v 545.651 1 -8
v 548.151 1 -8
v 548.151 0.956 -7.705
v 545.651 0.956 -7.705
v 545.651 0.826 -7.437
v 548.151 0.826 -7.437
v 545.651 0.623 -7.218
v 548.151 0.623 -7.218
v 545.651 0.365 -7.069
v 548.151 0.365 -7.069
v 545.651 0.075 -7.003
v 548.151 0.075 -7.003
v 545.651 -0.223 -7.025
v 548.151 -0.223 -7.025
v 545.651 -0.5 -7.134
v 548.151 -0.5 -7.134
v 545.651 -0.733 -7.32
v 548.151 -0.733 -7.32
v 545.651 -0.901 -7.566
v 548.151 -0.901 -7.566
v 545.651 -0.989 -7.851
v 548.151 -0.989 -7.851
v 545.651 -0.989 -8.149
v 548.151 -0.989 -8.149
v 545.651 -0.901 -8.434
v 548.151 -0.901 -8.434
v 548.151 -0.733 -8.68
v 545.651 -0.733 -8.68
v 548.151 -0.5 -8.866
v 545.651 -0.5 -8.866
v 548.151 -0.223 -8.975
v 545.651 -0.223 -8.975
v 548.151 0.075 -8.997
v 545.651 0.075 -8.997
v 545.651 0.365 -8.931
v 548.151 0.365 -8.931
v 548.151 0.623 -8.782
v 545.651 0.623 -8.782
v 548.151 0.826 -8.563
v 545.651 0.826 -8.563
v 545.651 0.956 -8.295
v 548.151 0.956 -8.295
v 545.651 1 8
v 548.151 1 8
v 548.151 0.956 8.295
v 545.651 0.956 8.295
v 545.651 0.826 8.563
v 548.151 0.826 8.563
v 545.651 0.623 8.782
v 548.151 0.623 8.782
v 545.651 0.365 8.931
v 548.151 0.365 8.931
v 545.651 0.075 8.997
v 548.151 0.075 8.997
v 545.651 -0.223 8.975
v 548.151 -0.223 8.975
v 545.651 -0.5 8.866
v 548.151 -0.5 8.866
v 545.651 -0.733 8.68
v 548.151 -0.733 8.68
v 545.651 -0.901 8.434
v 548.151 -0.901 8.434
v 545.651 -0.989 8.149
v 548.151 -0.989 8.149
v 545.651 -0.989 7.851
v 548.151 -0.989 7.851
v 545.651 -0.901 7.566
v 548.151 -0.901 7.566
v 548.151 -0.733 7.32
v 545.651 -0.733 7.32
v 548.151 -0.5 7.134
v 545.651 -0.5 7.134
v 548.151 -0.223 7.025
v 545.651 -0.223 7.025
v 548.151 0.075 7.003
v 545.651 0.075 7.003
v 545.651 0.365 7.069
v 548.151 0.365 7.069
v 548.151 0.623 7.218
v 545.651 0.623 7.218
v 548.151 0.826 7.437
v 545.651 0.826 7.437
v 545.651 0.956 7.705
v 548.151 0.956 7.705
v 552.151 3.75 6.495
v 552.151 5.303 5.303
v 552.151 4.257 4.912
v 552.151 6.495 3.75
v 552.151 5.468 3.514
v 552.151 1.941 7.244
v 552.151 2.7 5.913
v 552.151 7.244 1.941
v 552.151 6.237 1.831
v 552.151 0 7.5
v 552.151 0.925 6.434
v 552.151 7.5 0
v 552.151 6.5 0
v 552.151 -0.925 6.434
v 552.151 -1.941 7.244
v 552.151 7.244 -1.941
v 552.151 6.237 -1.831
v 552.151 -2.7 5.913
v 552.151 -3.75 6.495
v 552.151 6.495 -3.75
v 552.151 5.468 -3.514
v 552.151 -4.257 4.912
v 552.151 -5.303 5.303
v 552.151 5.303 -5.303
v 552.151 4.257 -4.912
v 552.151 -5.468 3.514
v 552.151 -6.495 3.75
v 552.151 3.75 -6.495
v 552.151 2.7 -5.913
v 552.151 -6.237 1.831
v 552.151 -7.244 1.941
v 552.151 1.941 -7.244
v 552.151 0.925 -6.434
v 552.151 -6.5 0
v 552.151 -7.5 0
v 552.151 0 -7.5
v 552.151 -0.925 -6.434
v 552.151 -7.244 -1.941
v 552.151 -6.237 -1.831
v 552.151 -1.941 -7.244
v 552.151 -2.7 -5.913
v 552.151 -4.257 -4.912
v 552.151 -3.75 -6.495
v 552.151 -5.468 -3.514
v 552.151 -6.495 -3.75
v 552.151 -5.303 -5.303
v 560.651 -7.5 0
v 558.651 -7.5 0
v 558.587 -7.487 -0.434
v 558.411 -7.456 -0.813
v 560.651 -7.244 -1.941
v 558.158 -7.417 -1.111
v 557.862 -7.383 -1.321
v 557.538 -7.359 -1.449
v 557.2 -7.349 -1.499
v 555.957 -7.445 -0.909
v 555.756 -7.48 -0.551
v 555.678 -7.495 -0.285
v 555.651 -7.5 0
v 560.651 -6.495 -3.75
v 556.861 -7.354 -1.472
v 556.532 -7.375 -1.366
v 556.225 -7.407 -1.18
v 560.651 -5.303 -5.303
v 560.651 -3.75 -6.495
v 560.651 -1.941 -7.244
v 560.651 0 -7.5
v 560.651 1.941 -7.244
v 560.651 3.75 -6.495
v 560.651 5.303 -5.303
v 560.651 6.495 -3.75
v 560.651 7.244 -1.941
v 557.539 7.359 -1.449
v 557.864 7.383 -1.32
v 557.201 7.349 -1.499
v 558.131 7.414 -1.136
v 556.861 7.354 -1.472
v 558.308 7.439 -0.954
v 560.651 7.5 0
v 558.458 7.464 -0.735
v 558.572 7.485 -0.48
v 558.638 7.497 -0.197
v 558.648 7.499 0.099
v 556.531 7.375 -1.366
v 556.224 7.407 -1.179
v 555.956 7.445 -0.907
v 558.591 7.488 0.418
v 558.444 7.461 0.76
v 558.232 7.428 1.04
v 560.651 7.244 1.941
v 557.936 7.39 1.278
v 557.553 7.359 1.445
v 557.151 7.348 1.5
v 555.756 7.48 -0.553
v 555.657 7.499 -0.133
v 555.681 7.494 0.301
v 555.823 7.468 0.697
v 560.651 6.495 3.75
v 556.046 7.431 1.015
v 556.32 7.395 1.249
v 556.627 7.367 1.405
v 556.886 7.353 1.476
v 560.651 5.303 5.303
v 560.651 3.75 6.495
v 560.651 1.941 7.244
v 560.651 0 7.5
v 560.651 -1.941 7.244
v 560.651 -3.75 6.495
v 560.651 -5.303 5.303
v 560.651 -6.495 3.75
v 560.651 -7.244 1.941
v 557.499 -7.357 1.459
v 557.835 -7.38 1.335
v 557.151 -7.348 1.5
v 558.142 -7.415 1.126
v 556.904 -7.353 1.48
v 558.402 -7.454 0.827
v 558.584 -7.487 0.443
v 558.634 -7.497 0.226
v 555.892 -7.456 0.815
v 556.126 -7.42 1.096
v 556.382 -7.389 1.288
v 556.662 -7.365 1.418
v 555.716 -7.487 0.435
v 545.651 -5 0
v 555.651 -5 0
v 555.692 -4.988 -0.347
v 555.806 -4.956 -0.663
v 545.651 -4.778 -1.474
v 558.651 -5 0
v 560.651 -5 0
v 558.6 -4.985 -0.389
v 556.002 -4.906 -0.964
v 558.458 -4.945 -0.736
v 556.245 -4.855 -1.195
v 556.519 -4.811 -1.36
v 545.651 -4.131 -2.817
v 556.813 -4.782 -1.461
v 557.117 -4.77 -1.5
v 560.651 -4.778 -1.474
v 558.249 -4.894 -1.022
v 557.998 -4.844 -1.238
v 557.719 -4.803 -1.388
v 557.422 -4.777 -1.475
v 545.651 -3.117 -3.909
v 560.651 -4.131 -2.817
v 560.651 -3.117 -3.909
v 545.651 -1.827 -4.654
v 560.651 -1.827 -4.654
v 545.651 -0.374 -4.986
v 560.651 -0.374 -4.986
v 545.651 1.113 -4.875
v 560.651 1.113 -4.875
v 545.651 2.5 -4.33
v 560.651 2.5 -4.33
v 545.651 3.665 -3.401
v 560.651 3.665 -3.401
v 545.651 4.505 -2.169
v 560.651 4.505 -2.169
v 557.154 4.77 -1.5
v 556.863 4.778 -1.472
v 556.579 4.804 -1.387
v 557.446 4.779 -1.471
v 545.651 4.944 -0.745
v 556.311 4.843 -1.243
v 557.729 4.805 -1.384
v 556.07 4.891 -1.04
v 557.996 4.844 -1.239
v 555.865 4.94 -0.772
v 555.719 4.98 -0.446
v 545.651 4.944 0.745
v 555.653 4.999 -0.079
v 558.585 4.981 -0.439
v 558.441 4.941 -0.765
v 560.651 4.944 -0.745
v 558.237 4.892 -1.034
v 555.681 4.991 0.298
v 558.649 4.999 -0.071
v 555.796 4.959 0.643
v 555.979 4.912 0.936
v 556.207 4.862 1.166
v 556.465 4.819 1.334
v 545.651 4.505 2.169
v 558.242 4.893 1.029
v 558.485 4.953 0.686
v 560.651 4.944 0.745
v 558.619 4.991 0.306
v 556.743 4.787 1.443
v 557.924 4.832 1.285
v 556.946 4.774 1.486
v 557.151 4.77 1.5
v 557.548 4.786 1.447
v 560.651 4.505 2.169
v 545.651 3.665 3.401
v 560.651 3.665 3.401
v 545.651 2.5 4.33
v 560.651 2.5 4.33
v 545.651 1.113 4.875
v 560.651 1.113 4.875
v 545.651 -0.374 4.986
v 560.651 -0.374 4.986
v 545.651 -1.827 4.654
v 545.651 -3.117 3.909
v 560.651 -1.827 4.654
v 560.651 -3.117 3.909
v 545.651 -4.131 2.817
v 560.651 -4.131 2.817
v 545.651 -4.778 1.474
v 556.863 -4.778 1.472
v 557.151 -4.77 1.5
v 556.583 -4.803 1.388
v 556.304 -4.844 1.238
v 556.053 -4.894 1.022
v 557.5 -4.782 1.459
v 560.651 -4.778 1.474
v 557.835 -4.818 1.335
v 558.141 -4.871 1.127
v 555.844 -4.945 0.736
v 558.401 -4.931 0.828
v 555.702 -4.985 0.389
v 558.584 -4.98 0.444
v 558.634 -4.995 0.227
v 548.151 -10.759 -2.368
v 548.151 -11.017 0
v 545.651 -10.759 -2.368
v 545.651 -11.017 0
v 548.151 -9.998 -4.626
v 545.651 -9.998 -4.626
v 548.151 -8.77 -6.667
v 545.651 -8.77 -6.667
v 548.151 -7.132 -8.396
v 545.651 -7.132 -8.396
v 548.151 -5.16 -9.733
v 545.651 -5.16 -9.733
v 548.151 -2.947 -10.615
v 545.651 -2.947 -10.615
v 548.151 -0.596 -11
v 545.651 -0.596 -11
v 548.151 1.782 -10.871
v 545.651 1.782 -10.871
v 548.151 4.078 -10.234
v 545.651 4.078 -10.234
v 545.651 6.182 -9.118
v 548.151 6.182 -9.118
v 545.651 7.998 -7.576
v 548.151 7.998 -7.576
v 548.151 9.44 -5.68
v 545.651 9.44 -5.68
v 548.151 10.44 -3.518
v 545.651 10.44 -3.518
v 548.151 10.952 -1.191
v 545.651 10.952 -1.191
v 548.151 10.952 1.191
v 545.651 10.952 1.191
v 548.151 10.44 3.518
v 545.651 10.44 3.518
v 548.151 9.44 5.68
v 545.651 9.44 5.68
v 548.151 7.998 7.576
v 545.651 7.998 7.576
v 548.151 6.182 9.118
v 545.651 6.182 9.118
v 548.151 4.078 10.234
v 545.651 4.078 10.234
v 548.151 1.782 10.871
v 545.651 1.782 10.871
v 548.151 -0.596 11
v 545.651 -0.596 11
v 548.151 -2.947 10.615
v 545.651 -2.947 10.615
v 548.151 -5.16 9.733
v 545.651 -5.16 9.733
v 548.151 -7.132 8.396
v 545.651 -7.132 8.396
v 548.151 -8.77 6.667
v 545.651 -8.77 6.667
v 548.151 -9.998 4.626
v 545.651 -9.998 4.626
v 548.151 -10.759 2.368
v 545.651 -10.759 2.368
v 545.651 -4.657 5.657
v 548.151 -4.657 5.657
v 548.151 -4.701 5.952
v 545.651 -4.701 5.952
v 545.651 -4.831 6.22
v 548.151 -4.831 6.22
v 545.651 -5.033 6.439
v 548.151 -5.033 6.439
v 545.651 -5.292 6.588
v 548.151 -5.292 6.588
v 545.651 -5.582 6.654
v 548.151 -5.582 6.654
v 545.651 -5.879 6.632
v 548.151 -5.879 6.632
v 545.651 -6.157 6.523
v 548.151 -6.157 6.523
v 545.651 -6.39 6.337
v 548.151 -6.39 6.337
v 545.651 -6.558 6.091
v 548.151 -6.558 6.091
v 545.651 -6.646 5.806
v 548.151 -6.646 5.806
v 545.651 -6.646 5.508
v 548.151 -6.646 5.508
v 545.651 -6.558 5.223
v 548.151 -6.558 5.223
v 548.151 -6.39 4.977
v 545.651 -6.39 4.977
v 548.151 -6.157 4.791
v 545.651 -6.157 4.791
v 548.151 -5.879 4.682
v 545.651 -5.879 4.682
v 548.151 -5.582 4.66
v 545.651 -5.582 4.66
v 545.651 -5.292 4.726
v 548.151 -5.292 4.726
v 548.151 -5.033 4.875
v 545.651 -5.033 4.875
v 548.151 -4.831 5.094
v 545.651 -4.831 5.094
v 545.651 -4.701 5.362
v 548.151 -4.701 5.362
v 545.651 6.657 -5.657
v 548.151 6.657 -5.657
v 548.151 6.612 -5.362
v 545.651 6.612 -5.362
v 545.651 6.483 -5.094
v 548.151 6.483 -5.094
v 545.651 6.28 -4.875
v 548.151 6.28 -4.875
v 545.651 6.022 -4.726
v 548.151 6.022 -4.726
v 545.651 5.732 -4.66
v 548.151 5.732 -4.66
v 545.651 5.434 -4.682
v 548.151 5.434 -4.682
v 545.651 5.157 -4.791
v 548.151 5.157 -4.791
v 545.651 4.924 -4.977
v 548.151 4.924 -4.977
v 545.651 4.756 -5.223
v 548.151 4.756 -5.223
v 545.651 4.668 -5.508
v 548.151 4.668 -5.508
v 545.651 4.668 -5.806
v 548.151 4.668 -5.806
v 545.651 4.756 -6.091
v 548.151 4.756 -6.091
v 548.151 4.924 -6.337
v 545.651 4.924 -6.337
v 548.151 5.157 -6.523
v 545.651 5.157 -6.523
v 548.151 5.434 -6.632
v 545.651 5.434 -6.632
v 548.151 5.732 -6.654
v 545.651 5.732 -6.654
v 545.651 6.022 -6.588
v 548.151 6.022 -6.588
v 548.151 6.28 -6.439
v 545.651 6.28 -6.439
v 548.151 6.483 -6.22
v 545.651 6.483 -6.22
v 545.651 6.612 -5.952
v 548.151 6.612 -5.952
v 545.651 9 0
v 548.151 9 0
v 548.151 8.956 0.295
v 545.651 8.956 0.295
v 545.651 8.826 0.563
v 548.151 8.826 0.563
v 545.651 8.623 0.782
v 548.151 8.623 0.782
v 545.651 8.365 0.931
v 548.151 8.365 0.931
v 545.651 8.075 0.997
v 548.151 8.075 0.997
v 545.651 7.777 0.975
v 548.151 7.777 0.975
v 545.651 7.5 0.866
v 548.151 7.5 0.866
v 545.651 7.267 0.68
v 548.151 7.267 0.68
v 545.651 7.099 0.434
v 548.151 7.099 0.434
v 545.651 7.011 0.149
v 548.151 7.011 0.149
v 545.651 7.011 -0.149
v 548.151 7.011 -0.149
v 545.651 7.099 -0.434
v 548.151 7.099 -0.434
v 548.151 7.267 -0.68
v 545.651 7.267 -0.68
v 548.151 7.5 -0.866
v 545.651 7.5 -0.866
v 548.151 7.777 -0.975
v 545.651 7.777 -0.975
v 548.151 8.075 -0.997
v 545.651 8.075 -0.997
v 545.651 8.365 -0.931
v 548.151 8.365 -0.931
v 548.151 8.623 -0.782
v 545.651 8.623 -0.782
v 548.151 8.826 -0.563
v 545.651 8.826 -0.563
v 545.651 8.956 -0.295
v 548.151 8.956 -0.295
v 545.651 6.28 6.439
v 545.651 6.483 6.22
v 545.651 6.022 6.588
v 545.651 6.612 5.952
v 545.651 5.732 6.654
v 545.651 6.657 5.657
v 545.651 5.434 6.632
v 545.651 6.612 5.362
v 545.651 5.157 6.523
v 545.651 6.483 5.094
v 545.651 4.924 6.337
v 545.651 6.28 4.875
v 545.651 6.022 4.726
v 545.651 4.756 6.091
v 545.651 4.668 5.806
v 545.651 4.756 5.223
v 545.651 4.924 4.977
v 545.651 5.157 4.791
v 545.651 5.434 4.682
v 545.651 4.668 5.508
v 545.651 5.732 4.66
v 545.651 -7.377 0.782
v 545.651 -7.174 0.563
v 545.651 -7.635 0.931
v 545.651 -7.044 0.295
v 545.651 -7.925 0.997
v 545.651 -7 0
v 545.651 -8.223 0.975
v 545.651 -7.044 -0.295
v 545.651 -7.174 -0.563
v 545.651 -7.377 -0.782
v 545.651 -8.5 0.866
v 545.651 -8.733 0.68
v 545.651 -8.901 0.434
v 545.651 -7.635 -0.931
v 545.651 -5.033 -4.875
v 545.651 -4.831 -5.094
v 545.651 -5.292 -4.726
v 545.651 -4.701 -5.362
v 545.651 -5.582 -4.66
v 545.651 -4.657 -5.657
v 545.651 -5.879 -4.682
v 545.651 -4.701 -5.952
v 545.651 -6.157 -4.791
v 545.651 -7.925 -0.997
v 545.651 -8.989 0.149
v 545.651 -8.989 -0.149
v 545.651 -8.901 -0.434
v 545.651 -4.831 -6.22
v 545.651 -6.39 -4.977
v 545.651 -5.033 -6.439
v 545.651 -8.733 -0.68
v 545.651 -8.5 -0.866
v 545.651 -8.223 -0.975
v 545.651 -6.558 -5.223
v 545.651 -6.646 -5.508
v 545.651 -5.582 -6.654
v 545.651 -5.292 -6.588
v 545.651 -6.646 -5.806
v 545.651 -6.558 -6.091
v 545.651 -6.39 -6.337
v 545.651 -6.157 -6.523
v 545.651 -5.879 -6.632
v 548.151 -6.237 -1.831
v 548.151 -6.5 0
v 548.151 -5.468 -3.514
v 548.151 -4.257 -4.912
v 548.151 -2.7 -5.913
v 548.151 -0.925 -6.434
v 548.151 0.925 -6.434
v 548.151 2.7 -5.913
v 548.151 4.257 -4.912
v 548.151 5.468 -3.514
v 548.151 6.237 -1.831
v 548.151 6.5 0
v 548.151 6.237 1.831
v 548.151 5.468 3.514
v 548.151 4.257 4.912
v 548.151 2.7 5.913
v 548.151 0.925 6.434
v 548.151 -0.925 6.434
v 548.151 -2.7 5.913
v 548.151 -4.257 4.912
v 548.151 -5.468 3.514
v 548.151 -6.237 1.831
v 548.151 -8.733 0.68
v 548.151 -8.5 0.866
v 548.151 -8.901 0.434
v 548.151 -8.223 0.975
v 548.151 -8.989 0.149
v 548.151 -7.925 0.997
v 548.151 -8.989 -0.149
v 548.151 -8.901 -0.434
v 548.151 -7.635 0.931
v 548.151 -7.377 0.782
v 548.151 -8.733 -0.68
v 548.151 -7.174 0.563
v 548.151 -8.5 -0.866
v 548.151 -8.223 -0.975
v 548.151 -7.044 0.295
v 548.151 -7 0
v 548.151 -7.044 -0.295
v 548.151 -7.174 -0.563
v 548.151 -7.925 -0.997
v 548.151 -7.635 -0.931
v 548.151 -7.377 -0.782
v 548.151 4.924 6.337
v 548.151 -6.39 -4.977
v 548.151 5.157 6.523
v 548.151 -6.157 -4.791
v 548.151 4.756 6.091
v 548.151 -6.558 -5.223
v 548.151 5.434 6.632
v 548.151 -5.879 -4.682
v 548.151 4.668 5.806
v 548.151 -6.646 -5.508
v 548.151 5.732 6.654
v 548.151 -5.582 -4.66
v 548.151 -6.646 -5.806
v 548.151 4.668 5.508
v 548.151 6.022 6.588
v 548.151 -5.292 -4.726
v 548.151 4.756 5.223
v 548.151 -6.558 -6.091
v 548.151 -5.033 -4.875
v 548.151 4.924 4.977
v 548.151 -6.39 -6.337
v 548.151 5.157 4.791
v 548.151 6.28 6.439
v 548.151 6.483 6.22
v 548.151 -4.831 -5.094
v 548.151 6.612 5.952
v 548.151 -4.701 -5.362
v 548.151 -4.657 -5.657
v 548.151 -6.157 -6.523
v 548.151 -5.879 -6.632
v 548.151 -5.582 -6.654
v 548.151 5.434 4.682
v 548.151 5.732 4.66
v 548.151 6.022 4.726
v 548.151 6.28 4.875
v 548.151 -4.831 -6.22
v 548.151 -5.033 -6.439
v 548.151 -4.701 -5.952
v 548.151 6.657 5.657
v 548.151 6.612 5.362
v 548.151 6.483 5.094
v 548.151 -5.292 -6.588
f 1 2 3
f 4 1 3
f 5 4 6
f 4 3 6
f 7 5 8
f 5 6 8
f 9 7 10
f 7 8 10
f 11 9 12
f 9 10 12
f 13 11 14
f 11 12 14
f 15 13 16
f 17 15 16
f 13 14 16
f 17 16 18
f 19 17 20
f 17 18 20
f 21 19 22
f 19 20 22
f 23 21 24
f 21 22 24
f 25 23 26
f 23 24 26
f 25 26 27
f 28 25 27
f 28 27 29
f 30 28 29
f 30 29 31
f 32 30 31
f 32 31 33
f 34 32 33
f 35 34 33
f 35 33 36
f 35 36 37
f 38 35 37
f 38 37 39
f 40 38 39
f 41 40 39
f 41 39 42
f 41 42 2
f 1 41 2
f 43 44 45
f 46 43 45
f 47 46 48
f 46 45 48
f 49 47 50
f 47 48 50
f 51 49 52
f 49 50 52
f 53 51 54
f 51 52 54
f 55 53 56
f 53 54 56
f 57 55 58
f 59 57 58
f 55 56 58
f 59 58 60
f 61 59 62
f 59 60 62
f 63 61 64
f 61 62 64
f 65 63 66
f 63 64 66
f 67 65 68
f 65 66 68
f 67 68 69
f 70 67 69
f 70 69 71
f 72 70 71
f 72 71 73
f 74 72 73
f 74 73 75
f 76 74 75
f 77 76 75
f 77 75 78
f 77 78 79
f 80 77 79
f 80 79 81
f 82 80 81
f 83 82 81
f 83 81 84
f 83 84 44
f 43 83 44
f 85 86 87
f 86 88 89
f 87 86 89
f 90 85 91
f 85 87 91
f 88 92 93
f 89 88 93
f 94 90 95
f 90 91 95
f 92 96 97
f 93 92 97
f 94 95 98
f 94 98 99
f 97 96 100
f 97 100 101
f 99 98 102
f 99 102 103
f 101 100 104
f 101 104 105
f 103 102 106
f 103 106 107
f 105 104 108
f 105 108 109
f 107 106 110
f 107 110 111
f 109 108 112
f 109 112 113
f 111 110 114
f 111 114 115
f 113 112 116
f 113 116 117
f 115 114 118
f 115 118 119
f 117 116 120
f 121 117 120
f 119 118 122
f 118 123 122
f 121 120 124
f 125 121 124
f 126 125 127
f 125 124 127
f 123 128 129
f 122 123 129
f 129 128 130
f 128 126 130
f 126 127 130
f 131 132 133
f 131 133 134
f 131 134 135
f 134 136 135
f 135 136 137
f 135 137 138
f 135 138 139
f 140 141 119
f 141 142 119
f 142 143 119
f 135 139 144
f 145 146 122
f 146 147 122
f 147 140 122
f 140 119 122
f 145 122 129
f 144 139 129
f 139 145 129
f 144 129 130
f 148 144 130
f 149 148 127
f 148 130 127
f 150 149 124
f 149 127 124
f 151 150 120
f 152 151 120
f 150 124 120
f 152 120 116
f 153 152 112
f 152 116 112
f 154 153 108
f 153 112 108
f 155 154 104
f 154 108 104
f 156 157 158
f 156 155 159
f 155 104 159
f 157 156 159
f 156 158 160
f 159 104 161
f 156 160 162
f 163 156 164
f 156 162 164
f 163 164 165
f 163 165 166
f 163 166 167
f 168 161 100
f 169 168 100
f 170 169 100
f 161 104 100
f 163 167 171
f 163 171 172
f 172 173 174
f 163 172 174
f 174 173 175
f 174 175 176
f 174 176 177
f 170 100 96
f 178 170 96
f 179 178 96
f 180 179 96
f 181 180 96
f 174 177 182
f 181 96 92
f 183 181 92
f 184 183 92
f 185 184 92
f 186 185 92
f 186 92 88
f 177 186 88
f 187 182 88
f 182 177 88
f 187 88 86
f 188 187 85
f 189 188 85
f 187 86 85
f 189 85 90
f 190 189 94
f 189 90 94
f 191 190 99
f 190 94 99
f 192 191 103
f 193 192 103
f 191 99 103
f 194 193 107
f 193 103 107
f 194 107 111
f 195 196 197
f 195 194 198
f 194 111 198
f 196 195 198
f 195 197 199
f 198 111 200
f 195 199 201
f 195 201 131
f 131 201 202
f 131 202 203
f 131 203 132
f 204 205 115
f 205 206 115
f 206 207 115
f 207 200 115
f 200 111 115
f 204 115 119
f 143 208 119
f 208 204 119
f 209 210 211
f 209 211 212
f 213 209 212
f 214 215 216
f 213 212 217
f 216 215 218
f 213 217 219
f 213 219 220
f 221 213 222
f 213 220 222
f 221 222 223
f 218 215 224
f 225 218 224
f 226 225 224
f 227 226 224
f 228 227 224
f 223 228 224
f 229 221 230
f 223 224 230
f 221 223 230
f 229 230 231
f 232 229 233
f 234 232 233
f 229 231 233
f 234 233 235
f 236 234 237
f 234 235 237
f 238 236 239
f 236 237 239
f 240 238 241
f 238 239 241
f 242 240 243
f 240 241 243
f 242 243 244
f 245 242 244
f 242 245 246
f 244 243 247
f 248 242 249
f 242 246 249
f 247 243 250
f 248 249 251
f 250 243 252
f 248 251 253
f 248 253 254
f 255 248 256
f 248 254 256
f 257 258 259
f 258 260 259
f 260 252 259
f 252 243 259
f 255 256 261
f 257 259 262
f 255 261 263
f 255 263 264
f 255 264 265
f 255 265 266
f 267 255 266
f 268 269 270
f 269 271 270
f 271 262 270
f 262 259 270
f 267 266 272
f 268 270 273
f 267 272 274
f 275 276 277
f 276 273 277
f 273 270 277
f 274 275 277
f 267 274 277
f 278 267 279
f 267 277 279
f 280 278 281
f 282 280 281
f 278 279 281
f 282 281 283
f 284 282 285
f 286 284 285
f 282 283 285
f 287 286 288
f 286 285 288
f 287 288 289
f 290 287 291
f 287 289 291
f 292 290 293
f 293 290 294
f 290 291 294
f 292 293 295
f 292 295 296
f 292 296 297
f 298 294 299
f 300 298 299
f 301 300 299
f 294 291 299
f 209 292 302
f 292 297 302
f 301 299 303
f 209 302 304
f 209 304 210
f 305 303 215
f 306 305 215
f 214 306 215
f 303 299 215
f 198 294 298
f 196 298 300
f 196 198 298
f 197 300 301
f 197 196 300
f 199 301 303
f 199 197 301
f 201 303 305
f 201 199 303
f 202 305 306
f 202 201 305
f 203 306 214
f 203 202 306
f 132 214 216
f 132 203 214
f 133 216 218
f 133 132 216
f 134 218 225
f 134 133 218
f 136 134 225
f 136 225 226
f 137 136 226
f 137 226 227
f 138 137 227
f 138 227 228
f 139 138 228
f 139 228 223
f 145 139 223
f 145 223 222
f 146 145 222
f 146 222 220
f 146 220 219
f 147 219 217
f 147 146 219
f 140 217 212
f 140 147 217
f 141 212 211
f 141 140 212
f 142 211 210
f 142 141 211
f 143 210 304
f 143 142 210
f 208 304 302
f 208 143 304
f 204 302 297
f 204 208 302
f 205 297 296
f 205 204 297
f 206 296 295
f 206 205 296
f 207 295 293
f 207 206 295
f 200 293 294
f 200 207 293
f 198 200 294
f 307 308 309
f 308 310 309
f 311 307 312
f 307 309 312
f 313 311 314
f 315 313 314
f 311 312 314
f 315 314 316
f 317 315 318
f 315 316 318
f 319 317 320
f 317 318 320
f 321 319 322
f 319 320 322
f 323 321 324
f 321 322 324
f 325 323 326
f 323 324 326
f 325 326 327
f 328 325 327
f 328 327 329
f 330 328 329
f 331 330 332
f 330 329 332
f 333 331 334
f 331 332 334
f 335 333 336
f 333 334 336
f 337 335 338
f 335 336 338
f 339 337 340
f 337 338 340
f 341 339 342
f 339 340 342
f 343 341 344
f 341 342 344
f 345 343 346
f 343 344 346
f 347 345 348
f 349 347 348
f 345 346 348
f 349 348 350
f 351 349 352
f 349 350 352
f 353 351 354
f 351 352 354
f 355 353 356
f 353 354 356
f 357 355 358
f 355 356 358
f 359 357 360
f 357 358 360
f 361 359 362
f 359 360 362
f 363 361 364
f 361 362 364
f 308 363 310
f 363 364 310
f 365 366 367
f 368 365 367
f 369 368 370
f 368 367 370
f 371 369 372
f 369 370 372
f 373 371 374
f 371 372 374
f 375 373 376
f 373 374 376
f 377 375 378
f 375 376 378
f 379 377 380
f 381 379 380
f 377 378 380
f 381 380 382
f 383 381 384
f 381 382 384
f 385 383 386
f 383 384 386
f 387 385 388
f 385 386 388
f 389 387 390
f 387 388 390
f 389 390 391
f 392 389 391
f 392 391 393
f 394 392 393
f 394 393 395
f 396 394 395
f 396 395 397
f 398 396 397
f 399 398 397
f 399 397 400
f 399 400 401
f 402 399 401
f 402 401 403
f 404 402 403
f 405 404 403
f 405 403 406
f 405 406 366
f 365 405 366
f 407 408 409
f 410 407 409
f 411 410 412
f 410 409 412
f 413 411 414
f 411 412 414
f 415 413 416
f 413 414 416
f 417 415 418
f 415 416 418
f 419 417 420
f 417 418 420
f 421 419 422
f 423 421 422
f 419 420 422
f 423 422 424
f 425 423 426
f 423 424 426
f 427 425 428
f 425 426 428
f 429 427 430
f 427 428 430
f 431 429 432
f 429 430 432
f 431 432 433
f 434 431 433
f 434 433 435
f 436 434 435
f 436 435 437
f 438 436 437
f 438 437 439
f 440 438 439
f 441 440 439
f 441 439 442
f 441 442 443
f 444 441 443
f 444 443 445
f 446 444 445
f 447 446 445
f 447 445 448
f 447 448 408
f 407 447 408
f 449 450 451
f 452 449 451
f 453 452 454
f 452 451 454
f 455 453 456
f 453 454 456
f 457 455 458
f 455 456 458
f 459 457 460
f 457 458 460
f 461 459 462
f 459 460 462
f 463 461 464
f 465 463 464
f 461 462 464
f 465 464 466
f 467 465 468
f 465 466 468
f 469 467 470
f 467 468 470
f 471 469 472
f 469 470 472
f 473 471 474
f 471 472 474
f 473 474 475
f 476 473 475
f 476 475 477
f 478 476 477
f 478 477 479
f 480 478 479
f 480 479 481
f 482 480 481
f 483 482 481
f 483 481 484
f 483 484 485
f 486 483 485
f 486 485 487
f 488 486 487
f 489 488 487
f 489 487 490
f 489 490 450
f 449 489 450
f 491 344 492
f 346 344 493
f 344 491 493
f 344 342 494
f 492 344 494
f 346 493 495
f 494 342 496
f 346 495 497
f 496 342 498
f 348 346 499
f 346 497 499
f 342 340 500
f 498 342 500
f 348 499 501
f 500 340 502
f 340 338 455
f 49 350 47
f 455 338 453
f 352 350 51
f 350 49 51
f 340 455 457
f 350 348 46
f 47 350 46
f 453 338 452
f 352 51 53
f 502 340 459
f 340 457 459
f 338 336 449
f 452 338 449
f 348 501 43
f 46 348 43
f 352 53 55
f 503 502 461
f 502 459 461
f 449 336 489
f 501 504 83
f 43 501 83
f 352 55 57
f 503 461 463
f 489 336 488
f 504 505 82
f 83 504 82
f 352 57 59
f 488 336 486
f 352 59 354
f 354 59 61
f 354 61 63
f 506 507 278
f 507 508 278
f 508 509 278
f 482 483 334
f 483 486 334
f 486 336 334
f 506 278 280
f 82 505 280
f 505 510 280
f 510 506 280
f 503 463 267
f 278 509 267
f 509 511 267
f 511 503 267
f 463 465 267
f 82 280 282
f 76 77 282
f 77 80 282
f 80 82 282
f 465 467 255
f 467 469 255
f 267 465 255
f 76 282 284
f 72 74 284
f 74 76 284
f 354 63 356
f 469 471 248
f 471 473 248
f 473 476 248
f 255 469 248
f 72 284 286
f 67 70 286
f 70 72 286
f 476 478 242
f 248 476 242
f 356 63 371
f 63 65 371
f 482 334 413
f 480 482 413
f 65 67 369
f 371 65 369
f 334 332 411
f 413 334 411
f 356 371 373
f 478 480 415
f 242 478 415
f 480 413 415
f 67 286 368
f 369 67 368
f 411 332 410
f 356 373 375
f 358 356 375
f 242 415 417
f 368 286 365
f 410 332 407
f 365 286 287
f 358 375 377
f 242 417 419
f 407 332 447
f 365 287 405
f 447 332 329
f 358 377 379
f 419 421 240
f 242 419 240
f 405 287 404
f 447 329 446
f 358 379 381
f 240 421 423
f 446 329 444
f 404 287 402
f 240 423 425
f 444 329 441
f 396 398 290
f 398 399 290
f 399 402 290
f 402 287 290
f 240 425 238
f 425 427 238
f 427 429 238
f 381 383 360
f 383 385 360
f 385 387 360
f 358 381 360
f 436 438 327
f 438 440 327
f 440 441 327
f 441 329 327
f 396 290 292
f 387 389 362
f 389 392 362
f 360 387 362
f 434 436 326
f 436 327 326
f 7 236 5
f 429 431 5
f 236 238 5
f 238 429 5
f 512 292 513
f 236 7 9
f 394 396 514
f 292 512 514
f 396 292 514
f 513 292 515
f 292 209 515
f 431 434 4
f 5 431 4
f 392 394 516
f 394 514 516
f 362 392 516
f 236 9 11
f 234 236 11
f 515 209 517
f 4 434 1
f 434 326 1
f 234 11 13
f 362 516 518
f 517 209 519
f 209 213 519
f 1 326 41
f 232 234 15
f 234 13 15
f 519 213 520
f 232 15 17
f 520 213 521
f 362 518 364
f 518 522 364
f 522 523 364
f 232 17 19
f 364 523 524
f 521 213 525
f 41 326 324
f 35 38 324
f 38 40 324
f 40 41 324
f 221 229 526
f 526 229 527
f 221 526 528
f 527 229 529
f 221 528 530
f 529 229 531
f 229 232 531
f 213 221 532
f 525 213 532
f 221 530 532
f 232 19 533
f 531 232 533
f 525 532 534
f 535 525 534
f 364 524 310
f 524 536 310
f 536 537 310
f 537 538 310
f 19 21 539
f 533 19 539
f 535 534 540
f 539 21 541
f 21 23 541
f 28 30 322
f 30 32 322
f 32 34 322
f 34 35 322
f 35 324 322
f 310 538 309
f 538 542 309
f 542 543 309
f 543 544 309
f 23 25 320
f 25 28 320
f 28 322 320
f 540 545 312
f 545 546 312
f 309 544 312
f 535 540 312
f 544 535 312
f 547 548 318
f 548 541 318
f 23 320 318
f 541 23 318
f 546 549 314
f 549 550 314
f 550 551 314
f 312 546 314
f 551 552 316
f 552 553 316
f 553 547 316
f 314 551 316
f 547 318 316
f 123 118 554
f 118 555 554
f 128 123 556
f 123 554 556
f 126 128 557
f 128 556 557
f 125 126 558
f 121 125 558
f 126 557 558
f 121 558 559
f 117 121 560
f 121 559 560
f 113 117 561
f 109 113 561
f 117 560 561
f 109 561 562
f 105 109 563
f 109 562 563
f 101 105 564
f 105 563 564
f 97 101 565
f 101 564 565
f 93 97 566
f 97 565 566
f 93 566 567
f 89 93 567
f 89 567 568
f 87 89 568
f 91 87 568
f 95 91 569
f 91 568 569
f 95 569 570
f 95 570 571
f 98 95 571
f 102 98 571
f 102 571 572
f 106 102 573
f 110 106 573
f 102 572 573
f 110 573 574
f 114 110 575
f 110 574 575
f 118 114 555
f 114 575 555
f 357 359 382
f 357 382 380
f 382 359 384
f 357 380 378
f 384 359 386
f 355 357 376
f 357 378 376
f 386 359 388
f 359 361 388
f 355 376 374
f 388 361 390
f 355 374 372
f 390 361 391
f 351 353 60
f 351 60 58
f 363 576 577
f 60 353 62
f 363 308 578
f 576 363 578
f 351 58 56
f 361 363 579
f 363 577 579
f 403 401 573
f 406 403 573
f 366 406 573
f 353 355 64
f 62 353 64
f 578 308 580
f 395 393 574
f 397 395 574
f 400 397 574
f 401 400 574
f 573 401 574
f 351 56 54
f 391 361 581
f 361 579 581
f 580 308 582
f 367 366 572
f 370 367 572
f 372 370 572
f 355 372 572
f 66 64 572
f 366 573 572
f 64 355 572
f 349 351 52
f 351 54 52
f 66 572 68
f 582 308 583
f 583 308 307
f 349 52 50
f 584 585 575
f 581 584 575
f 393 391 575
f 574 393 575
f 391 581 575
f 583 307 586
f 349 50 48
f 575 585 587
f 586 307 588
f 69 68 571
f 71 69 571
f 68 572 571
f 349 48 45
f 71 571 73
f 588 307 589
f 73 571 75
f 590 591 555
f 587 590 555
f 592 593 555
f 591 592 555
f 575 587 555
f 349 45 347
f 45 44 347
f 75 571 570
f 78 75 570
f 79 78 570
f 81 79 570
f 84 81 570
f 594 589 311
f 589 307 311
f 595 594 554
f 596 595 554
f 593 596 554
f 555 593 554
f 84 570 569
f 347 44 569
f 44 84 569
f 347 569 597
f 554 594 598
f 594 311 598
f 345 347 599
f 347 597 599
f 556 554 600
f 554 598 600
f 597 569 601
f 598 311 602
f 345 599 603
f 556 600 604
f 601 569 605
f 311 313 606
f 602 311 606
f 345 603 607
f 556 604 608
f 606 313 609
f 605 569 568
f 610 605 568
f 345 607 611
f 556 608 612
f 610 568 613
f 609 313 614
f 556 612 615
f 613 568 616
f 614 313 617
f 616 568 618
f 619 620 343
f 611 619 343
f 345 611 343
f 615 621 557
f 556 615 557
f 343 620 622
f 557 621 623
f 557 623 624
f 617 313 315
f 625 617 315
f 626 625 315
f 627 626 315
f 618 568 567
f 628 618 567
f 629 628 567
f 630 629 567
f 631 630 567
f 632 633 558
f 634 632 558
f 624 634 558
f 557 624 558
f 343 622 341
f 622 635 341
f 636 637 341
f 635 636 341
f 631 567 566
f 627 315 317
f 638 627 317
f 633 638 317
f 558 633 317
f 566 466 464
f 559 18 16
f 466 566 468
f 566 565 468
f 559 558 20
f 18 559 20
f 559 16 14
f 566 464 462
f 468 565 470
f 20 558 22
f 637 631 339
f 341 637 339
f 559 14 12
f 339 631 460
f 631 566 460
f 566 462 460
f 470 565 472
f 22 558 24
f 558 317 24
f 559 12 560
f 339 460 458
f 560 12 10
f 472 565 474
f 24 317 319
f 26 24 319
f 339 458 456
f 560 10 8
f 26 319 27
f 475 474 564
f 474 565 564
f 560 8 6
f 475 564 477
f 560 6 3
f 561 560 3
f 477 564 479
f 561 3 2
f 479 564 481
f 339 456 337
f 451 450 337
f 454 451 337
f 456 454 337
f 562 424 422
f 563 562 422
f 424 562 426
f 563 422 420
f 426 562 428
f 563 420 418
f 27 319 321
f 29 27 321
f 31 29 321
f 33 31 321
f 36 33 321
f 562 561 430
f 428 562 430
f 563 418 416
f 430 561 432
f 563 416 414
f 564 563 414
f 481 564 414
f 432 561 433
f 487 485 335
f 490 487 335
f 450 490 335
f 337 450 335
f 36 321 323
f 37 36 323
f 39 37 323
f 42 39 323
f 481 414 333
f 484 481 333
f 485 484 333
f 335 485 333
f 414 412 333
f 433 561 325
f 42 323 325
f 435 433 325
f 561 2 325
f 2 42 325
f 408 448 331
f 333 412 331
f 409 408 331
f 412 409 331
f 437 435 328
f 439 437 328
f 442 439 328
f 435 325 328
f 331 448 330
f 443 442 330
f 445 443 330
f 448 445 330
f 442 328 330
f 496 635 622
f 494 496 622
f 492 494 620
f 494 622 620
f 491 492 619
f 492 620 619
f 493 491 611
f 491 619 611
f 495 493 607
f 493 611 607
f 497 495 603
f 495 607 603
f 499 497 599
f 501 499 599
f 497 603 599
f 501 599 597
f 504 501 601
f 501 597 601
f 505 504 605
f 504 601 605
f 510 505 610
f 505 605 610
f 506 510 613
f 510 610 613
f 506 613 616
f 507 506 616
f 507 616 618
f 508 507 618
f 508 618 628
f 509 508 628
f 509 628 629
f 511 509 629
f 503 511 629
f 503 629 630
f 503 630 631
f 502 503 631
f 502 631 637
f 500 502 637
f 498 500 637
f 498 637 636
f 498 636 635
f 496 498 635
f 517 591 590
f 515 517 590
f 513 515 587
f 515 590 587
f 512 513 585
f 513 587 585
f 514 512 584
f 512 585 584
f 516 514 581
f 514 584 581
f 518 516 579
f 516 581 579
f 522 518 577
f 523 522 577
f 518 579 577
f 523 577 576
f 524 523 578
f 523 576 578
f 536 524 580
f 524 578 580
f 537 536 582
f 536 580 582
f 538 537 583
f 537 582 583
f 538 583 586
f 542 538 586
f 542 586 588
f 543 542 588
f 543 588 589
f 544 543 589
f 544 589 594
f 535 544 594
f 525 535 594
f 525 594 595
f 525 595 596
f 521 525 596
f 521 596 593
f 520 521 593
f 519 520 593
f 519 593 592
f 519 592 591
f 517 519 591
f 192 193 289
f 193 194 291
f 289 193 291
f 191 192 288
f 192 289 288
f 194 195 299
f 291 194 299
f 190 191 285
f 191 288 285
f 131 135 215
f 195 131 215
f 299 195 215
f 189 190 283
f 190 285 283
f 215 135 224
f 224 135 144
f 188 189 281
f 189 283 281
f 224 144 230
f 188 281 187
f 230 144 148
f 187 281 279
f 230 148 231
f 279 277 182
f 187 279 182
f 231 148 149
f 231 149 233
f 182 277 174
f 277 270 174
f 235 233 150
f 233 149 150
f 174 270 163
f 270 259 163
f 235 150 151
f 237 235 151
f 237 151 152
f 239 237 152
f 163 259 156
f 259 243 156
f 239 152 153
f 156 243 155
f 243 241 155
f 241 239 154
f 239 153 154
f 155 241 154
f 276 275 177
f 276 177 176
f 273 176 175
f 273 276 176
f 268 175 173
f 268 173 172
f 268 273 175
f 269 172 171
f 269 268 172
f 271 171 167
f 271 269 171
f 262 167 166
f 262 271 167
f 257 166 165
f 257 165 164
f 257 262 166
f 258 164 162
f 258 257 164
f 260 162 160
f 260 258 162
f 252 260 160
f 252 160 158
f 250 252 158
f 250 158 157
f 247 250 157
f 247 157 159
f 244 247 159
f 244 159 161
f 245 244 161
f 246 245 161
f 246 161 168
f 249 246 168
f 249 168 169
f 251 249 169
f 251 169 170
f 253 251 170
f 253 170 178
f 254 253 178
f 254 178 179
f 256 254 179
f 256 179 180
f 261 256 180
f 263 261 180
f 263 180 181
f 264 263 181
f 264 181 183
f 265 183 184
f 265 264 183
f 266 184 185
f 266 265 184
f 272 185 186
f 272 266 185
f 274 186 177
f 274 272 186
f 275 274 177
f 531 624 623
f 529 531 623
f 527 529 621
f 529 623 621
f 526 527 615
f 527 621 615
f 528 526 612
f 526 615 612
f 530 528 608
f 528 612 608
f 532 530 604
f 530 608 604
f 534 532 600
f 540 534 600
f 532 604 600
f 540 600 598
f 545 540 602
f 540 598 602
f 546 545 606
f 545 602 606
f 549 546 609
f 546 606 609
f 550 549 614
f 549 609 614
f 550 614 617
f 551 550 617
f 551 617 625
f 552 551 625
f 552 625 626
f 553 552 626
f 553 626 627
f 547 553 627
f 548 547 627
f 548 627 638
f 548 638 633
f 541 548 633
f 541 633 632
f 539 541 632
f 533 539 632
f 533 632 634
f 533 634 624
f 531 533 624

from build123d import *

# Parameters (mm, degrees)
CUT_EXTRUDE1_DEPTH      = 561.867355885
CUT_EXTRUDE1_DEPTH_BACK = 561.867355885
SKETCH3_R               = 1.5
SKETCH13_R              = 1
CUT_EXTRUDE2_DEPTH      = 20.974512648


with BuildPart() as part:
    # Sketch2 → Revolve1 (revolve)
    with BuildSketch(Plane.XY, mode=Mode.PRIVATE) as revolve1_sk:
        Polygon((560.650925037, 5), (560.650925037, 7.5), (552.150925037, 7.5), (552.150925037, 6.5), (548.150925037, 6.5), (548.150925037, 7.5), (548.150925037, 11.016604582), (545.650925037, 11.016604582), (545.650925037, 5), align=None)
    revolve(revolve1_sk.sketch.rotate(Axis((542.916757592, 0, 0), (1, 0, 0)), 180), axis=Axis((542.916757592, 0, 0), (1, 0, 0)))

    # Sketch3 → Cut-Extrude1 (cut, two sides: drawn at the far end of the back side and taken through both)
    with BuildSketch(Plane(origin=(0, 0, 0), x_dir=(1, 0, 0), z_dir=(0, 1, 0)).offset(-CUT_EXTRUDE1_DEPTH_BACK)):
        with Locations(Location((557.150925037, 0, 0), (0, 0, 270))):
            Circle(SKETCH3_R)
    extrude(amount=CUT_EXTRUDE1_DEPTH + CUT_EXTRUDE1_DEPTH_BACK, mode=Mode.SUBTRACT)

    # Sketch13 → Cut-Extrude2 (cut, through all)
    with BuildSketch(Plane(origin=(548.150925037, 0, 0), x_dir=(0, 0, -1), z_dir=(1, 0, 0))):
        with Locations(Location((0, 8, 0), (0, 0, 90))):
            Circle(SKETCH13_R)
        with Locations(Location((5.656854249, 5.656854249, 0), (0, 0, 90))):
            Circle(SKETCH13_R)
        with Locations(Location((8, 0, 0), (0, 0, 90))):
            Circle(SKETCH13_R)
        with Locations(Location((5.656854249, -5.656854249, 0), (0, 0, 90))):
            Circle(SKETCH13_R)
        with Locations(Location((0, -8, 0), (0, 0, 90))):
            Circle(SKETCH13_R)
        with Locations(Location((-5.656854249, -5.656854249, 0), (0, 0, 90))):
            Circle(SKETCH13_R)
        with Locations(Location((-8, 0, 0), (0, 0, 90))):
            Circle(SKETCH13_R)
        with Locations(Location((-5.656854249, 5.656854249, 0), (0, 0, 90))):
            Circle(SKETCH13_R)
    extrude(amount=-CUT_EXTRUDE2_DEPTH, mode=Mode.SUBTRACT)


solid = part.part
